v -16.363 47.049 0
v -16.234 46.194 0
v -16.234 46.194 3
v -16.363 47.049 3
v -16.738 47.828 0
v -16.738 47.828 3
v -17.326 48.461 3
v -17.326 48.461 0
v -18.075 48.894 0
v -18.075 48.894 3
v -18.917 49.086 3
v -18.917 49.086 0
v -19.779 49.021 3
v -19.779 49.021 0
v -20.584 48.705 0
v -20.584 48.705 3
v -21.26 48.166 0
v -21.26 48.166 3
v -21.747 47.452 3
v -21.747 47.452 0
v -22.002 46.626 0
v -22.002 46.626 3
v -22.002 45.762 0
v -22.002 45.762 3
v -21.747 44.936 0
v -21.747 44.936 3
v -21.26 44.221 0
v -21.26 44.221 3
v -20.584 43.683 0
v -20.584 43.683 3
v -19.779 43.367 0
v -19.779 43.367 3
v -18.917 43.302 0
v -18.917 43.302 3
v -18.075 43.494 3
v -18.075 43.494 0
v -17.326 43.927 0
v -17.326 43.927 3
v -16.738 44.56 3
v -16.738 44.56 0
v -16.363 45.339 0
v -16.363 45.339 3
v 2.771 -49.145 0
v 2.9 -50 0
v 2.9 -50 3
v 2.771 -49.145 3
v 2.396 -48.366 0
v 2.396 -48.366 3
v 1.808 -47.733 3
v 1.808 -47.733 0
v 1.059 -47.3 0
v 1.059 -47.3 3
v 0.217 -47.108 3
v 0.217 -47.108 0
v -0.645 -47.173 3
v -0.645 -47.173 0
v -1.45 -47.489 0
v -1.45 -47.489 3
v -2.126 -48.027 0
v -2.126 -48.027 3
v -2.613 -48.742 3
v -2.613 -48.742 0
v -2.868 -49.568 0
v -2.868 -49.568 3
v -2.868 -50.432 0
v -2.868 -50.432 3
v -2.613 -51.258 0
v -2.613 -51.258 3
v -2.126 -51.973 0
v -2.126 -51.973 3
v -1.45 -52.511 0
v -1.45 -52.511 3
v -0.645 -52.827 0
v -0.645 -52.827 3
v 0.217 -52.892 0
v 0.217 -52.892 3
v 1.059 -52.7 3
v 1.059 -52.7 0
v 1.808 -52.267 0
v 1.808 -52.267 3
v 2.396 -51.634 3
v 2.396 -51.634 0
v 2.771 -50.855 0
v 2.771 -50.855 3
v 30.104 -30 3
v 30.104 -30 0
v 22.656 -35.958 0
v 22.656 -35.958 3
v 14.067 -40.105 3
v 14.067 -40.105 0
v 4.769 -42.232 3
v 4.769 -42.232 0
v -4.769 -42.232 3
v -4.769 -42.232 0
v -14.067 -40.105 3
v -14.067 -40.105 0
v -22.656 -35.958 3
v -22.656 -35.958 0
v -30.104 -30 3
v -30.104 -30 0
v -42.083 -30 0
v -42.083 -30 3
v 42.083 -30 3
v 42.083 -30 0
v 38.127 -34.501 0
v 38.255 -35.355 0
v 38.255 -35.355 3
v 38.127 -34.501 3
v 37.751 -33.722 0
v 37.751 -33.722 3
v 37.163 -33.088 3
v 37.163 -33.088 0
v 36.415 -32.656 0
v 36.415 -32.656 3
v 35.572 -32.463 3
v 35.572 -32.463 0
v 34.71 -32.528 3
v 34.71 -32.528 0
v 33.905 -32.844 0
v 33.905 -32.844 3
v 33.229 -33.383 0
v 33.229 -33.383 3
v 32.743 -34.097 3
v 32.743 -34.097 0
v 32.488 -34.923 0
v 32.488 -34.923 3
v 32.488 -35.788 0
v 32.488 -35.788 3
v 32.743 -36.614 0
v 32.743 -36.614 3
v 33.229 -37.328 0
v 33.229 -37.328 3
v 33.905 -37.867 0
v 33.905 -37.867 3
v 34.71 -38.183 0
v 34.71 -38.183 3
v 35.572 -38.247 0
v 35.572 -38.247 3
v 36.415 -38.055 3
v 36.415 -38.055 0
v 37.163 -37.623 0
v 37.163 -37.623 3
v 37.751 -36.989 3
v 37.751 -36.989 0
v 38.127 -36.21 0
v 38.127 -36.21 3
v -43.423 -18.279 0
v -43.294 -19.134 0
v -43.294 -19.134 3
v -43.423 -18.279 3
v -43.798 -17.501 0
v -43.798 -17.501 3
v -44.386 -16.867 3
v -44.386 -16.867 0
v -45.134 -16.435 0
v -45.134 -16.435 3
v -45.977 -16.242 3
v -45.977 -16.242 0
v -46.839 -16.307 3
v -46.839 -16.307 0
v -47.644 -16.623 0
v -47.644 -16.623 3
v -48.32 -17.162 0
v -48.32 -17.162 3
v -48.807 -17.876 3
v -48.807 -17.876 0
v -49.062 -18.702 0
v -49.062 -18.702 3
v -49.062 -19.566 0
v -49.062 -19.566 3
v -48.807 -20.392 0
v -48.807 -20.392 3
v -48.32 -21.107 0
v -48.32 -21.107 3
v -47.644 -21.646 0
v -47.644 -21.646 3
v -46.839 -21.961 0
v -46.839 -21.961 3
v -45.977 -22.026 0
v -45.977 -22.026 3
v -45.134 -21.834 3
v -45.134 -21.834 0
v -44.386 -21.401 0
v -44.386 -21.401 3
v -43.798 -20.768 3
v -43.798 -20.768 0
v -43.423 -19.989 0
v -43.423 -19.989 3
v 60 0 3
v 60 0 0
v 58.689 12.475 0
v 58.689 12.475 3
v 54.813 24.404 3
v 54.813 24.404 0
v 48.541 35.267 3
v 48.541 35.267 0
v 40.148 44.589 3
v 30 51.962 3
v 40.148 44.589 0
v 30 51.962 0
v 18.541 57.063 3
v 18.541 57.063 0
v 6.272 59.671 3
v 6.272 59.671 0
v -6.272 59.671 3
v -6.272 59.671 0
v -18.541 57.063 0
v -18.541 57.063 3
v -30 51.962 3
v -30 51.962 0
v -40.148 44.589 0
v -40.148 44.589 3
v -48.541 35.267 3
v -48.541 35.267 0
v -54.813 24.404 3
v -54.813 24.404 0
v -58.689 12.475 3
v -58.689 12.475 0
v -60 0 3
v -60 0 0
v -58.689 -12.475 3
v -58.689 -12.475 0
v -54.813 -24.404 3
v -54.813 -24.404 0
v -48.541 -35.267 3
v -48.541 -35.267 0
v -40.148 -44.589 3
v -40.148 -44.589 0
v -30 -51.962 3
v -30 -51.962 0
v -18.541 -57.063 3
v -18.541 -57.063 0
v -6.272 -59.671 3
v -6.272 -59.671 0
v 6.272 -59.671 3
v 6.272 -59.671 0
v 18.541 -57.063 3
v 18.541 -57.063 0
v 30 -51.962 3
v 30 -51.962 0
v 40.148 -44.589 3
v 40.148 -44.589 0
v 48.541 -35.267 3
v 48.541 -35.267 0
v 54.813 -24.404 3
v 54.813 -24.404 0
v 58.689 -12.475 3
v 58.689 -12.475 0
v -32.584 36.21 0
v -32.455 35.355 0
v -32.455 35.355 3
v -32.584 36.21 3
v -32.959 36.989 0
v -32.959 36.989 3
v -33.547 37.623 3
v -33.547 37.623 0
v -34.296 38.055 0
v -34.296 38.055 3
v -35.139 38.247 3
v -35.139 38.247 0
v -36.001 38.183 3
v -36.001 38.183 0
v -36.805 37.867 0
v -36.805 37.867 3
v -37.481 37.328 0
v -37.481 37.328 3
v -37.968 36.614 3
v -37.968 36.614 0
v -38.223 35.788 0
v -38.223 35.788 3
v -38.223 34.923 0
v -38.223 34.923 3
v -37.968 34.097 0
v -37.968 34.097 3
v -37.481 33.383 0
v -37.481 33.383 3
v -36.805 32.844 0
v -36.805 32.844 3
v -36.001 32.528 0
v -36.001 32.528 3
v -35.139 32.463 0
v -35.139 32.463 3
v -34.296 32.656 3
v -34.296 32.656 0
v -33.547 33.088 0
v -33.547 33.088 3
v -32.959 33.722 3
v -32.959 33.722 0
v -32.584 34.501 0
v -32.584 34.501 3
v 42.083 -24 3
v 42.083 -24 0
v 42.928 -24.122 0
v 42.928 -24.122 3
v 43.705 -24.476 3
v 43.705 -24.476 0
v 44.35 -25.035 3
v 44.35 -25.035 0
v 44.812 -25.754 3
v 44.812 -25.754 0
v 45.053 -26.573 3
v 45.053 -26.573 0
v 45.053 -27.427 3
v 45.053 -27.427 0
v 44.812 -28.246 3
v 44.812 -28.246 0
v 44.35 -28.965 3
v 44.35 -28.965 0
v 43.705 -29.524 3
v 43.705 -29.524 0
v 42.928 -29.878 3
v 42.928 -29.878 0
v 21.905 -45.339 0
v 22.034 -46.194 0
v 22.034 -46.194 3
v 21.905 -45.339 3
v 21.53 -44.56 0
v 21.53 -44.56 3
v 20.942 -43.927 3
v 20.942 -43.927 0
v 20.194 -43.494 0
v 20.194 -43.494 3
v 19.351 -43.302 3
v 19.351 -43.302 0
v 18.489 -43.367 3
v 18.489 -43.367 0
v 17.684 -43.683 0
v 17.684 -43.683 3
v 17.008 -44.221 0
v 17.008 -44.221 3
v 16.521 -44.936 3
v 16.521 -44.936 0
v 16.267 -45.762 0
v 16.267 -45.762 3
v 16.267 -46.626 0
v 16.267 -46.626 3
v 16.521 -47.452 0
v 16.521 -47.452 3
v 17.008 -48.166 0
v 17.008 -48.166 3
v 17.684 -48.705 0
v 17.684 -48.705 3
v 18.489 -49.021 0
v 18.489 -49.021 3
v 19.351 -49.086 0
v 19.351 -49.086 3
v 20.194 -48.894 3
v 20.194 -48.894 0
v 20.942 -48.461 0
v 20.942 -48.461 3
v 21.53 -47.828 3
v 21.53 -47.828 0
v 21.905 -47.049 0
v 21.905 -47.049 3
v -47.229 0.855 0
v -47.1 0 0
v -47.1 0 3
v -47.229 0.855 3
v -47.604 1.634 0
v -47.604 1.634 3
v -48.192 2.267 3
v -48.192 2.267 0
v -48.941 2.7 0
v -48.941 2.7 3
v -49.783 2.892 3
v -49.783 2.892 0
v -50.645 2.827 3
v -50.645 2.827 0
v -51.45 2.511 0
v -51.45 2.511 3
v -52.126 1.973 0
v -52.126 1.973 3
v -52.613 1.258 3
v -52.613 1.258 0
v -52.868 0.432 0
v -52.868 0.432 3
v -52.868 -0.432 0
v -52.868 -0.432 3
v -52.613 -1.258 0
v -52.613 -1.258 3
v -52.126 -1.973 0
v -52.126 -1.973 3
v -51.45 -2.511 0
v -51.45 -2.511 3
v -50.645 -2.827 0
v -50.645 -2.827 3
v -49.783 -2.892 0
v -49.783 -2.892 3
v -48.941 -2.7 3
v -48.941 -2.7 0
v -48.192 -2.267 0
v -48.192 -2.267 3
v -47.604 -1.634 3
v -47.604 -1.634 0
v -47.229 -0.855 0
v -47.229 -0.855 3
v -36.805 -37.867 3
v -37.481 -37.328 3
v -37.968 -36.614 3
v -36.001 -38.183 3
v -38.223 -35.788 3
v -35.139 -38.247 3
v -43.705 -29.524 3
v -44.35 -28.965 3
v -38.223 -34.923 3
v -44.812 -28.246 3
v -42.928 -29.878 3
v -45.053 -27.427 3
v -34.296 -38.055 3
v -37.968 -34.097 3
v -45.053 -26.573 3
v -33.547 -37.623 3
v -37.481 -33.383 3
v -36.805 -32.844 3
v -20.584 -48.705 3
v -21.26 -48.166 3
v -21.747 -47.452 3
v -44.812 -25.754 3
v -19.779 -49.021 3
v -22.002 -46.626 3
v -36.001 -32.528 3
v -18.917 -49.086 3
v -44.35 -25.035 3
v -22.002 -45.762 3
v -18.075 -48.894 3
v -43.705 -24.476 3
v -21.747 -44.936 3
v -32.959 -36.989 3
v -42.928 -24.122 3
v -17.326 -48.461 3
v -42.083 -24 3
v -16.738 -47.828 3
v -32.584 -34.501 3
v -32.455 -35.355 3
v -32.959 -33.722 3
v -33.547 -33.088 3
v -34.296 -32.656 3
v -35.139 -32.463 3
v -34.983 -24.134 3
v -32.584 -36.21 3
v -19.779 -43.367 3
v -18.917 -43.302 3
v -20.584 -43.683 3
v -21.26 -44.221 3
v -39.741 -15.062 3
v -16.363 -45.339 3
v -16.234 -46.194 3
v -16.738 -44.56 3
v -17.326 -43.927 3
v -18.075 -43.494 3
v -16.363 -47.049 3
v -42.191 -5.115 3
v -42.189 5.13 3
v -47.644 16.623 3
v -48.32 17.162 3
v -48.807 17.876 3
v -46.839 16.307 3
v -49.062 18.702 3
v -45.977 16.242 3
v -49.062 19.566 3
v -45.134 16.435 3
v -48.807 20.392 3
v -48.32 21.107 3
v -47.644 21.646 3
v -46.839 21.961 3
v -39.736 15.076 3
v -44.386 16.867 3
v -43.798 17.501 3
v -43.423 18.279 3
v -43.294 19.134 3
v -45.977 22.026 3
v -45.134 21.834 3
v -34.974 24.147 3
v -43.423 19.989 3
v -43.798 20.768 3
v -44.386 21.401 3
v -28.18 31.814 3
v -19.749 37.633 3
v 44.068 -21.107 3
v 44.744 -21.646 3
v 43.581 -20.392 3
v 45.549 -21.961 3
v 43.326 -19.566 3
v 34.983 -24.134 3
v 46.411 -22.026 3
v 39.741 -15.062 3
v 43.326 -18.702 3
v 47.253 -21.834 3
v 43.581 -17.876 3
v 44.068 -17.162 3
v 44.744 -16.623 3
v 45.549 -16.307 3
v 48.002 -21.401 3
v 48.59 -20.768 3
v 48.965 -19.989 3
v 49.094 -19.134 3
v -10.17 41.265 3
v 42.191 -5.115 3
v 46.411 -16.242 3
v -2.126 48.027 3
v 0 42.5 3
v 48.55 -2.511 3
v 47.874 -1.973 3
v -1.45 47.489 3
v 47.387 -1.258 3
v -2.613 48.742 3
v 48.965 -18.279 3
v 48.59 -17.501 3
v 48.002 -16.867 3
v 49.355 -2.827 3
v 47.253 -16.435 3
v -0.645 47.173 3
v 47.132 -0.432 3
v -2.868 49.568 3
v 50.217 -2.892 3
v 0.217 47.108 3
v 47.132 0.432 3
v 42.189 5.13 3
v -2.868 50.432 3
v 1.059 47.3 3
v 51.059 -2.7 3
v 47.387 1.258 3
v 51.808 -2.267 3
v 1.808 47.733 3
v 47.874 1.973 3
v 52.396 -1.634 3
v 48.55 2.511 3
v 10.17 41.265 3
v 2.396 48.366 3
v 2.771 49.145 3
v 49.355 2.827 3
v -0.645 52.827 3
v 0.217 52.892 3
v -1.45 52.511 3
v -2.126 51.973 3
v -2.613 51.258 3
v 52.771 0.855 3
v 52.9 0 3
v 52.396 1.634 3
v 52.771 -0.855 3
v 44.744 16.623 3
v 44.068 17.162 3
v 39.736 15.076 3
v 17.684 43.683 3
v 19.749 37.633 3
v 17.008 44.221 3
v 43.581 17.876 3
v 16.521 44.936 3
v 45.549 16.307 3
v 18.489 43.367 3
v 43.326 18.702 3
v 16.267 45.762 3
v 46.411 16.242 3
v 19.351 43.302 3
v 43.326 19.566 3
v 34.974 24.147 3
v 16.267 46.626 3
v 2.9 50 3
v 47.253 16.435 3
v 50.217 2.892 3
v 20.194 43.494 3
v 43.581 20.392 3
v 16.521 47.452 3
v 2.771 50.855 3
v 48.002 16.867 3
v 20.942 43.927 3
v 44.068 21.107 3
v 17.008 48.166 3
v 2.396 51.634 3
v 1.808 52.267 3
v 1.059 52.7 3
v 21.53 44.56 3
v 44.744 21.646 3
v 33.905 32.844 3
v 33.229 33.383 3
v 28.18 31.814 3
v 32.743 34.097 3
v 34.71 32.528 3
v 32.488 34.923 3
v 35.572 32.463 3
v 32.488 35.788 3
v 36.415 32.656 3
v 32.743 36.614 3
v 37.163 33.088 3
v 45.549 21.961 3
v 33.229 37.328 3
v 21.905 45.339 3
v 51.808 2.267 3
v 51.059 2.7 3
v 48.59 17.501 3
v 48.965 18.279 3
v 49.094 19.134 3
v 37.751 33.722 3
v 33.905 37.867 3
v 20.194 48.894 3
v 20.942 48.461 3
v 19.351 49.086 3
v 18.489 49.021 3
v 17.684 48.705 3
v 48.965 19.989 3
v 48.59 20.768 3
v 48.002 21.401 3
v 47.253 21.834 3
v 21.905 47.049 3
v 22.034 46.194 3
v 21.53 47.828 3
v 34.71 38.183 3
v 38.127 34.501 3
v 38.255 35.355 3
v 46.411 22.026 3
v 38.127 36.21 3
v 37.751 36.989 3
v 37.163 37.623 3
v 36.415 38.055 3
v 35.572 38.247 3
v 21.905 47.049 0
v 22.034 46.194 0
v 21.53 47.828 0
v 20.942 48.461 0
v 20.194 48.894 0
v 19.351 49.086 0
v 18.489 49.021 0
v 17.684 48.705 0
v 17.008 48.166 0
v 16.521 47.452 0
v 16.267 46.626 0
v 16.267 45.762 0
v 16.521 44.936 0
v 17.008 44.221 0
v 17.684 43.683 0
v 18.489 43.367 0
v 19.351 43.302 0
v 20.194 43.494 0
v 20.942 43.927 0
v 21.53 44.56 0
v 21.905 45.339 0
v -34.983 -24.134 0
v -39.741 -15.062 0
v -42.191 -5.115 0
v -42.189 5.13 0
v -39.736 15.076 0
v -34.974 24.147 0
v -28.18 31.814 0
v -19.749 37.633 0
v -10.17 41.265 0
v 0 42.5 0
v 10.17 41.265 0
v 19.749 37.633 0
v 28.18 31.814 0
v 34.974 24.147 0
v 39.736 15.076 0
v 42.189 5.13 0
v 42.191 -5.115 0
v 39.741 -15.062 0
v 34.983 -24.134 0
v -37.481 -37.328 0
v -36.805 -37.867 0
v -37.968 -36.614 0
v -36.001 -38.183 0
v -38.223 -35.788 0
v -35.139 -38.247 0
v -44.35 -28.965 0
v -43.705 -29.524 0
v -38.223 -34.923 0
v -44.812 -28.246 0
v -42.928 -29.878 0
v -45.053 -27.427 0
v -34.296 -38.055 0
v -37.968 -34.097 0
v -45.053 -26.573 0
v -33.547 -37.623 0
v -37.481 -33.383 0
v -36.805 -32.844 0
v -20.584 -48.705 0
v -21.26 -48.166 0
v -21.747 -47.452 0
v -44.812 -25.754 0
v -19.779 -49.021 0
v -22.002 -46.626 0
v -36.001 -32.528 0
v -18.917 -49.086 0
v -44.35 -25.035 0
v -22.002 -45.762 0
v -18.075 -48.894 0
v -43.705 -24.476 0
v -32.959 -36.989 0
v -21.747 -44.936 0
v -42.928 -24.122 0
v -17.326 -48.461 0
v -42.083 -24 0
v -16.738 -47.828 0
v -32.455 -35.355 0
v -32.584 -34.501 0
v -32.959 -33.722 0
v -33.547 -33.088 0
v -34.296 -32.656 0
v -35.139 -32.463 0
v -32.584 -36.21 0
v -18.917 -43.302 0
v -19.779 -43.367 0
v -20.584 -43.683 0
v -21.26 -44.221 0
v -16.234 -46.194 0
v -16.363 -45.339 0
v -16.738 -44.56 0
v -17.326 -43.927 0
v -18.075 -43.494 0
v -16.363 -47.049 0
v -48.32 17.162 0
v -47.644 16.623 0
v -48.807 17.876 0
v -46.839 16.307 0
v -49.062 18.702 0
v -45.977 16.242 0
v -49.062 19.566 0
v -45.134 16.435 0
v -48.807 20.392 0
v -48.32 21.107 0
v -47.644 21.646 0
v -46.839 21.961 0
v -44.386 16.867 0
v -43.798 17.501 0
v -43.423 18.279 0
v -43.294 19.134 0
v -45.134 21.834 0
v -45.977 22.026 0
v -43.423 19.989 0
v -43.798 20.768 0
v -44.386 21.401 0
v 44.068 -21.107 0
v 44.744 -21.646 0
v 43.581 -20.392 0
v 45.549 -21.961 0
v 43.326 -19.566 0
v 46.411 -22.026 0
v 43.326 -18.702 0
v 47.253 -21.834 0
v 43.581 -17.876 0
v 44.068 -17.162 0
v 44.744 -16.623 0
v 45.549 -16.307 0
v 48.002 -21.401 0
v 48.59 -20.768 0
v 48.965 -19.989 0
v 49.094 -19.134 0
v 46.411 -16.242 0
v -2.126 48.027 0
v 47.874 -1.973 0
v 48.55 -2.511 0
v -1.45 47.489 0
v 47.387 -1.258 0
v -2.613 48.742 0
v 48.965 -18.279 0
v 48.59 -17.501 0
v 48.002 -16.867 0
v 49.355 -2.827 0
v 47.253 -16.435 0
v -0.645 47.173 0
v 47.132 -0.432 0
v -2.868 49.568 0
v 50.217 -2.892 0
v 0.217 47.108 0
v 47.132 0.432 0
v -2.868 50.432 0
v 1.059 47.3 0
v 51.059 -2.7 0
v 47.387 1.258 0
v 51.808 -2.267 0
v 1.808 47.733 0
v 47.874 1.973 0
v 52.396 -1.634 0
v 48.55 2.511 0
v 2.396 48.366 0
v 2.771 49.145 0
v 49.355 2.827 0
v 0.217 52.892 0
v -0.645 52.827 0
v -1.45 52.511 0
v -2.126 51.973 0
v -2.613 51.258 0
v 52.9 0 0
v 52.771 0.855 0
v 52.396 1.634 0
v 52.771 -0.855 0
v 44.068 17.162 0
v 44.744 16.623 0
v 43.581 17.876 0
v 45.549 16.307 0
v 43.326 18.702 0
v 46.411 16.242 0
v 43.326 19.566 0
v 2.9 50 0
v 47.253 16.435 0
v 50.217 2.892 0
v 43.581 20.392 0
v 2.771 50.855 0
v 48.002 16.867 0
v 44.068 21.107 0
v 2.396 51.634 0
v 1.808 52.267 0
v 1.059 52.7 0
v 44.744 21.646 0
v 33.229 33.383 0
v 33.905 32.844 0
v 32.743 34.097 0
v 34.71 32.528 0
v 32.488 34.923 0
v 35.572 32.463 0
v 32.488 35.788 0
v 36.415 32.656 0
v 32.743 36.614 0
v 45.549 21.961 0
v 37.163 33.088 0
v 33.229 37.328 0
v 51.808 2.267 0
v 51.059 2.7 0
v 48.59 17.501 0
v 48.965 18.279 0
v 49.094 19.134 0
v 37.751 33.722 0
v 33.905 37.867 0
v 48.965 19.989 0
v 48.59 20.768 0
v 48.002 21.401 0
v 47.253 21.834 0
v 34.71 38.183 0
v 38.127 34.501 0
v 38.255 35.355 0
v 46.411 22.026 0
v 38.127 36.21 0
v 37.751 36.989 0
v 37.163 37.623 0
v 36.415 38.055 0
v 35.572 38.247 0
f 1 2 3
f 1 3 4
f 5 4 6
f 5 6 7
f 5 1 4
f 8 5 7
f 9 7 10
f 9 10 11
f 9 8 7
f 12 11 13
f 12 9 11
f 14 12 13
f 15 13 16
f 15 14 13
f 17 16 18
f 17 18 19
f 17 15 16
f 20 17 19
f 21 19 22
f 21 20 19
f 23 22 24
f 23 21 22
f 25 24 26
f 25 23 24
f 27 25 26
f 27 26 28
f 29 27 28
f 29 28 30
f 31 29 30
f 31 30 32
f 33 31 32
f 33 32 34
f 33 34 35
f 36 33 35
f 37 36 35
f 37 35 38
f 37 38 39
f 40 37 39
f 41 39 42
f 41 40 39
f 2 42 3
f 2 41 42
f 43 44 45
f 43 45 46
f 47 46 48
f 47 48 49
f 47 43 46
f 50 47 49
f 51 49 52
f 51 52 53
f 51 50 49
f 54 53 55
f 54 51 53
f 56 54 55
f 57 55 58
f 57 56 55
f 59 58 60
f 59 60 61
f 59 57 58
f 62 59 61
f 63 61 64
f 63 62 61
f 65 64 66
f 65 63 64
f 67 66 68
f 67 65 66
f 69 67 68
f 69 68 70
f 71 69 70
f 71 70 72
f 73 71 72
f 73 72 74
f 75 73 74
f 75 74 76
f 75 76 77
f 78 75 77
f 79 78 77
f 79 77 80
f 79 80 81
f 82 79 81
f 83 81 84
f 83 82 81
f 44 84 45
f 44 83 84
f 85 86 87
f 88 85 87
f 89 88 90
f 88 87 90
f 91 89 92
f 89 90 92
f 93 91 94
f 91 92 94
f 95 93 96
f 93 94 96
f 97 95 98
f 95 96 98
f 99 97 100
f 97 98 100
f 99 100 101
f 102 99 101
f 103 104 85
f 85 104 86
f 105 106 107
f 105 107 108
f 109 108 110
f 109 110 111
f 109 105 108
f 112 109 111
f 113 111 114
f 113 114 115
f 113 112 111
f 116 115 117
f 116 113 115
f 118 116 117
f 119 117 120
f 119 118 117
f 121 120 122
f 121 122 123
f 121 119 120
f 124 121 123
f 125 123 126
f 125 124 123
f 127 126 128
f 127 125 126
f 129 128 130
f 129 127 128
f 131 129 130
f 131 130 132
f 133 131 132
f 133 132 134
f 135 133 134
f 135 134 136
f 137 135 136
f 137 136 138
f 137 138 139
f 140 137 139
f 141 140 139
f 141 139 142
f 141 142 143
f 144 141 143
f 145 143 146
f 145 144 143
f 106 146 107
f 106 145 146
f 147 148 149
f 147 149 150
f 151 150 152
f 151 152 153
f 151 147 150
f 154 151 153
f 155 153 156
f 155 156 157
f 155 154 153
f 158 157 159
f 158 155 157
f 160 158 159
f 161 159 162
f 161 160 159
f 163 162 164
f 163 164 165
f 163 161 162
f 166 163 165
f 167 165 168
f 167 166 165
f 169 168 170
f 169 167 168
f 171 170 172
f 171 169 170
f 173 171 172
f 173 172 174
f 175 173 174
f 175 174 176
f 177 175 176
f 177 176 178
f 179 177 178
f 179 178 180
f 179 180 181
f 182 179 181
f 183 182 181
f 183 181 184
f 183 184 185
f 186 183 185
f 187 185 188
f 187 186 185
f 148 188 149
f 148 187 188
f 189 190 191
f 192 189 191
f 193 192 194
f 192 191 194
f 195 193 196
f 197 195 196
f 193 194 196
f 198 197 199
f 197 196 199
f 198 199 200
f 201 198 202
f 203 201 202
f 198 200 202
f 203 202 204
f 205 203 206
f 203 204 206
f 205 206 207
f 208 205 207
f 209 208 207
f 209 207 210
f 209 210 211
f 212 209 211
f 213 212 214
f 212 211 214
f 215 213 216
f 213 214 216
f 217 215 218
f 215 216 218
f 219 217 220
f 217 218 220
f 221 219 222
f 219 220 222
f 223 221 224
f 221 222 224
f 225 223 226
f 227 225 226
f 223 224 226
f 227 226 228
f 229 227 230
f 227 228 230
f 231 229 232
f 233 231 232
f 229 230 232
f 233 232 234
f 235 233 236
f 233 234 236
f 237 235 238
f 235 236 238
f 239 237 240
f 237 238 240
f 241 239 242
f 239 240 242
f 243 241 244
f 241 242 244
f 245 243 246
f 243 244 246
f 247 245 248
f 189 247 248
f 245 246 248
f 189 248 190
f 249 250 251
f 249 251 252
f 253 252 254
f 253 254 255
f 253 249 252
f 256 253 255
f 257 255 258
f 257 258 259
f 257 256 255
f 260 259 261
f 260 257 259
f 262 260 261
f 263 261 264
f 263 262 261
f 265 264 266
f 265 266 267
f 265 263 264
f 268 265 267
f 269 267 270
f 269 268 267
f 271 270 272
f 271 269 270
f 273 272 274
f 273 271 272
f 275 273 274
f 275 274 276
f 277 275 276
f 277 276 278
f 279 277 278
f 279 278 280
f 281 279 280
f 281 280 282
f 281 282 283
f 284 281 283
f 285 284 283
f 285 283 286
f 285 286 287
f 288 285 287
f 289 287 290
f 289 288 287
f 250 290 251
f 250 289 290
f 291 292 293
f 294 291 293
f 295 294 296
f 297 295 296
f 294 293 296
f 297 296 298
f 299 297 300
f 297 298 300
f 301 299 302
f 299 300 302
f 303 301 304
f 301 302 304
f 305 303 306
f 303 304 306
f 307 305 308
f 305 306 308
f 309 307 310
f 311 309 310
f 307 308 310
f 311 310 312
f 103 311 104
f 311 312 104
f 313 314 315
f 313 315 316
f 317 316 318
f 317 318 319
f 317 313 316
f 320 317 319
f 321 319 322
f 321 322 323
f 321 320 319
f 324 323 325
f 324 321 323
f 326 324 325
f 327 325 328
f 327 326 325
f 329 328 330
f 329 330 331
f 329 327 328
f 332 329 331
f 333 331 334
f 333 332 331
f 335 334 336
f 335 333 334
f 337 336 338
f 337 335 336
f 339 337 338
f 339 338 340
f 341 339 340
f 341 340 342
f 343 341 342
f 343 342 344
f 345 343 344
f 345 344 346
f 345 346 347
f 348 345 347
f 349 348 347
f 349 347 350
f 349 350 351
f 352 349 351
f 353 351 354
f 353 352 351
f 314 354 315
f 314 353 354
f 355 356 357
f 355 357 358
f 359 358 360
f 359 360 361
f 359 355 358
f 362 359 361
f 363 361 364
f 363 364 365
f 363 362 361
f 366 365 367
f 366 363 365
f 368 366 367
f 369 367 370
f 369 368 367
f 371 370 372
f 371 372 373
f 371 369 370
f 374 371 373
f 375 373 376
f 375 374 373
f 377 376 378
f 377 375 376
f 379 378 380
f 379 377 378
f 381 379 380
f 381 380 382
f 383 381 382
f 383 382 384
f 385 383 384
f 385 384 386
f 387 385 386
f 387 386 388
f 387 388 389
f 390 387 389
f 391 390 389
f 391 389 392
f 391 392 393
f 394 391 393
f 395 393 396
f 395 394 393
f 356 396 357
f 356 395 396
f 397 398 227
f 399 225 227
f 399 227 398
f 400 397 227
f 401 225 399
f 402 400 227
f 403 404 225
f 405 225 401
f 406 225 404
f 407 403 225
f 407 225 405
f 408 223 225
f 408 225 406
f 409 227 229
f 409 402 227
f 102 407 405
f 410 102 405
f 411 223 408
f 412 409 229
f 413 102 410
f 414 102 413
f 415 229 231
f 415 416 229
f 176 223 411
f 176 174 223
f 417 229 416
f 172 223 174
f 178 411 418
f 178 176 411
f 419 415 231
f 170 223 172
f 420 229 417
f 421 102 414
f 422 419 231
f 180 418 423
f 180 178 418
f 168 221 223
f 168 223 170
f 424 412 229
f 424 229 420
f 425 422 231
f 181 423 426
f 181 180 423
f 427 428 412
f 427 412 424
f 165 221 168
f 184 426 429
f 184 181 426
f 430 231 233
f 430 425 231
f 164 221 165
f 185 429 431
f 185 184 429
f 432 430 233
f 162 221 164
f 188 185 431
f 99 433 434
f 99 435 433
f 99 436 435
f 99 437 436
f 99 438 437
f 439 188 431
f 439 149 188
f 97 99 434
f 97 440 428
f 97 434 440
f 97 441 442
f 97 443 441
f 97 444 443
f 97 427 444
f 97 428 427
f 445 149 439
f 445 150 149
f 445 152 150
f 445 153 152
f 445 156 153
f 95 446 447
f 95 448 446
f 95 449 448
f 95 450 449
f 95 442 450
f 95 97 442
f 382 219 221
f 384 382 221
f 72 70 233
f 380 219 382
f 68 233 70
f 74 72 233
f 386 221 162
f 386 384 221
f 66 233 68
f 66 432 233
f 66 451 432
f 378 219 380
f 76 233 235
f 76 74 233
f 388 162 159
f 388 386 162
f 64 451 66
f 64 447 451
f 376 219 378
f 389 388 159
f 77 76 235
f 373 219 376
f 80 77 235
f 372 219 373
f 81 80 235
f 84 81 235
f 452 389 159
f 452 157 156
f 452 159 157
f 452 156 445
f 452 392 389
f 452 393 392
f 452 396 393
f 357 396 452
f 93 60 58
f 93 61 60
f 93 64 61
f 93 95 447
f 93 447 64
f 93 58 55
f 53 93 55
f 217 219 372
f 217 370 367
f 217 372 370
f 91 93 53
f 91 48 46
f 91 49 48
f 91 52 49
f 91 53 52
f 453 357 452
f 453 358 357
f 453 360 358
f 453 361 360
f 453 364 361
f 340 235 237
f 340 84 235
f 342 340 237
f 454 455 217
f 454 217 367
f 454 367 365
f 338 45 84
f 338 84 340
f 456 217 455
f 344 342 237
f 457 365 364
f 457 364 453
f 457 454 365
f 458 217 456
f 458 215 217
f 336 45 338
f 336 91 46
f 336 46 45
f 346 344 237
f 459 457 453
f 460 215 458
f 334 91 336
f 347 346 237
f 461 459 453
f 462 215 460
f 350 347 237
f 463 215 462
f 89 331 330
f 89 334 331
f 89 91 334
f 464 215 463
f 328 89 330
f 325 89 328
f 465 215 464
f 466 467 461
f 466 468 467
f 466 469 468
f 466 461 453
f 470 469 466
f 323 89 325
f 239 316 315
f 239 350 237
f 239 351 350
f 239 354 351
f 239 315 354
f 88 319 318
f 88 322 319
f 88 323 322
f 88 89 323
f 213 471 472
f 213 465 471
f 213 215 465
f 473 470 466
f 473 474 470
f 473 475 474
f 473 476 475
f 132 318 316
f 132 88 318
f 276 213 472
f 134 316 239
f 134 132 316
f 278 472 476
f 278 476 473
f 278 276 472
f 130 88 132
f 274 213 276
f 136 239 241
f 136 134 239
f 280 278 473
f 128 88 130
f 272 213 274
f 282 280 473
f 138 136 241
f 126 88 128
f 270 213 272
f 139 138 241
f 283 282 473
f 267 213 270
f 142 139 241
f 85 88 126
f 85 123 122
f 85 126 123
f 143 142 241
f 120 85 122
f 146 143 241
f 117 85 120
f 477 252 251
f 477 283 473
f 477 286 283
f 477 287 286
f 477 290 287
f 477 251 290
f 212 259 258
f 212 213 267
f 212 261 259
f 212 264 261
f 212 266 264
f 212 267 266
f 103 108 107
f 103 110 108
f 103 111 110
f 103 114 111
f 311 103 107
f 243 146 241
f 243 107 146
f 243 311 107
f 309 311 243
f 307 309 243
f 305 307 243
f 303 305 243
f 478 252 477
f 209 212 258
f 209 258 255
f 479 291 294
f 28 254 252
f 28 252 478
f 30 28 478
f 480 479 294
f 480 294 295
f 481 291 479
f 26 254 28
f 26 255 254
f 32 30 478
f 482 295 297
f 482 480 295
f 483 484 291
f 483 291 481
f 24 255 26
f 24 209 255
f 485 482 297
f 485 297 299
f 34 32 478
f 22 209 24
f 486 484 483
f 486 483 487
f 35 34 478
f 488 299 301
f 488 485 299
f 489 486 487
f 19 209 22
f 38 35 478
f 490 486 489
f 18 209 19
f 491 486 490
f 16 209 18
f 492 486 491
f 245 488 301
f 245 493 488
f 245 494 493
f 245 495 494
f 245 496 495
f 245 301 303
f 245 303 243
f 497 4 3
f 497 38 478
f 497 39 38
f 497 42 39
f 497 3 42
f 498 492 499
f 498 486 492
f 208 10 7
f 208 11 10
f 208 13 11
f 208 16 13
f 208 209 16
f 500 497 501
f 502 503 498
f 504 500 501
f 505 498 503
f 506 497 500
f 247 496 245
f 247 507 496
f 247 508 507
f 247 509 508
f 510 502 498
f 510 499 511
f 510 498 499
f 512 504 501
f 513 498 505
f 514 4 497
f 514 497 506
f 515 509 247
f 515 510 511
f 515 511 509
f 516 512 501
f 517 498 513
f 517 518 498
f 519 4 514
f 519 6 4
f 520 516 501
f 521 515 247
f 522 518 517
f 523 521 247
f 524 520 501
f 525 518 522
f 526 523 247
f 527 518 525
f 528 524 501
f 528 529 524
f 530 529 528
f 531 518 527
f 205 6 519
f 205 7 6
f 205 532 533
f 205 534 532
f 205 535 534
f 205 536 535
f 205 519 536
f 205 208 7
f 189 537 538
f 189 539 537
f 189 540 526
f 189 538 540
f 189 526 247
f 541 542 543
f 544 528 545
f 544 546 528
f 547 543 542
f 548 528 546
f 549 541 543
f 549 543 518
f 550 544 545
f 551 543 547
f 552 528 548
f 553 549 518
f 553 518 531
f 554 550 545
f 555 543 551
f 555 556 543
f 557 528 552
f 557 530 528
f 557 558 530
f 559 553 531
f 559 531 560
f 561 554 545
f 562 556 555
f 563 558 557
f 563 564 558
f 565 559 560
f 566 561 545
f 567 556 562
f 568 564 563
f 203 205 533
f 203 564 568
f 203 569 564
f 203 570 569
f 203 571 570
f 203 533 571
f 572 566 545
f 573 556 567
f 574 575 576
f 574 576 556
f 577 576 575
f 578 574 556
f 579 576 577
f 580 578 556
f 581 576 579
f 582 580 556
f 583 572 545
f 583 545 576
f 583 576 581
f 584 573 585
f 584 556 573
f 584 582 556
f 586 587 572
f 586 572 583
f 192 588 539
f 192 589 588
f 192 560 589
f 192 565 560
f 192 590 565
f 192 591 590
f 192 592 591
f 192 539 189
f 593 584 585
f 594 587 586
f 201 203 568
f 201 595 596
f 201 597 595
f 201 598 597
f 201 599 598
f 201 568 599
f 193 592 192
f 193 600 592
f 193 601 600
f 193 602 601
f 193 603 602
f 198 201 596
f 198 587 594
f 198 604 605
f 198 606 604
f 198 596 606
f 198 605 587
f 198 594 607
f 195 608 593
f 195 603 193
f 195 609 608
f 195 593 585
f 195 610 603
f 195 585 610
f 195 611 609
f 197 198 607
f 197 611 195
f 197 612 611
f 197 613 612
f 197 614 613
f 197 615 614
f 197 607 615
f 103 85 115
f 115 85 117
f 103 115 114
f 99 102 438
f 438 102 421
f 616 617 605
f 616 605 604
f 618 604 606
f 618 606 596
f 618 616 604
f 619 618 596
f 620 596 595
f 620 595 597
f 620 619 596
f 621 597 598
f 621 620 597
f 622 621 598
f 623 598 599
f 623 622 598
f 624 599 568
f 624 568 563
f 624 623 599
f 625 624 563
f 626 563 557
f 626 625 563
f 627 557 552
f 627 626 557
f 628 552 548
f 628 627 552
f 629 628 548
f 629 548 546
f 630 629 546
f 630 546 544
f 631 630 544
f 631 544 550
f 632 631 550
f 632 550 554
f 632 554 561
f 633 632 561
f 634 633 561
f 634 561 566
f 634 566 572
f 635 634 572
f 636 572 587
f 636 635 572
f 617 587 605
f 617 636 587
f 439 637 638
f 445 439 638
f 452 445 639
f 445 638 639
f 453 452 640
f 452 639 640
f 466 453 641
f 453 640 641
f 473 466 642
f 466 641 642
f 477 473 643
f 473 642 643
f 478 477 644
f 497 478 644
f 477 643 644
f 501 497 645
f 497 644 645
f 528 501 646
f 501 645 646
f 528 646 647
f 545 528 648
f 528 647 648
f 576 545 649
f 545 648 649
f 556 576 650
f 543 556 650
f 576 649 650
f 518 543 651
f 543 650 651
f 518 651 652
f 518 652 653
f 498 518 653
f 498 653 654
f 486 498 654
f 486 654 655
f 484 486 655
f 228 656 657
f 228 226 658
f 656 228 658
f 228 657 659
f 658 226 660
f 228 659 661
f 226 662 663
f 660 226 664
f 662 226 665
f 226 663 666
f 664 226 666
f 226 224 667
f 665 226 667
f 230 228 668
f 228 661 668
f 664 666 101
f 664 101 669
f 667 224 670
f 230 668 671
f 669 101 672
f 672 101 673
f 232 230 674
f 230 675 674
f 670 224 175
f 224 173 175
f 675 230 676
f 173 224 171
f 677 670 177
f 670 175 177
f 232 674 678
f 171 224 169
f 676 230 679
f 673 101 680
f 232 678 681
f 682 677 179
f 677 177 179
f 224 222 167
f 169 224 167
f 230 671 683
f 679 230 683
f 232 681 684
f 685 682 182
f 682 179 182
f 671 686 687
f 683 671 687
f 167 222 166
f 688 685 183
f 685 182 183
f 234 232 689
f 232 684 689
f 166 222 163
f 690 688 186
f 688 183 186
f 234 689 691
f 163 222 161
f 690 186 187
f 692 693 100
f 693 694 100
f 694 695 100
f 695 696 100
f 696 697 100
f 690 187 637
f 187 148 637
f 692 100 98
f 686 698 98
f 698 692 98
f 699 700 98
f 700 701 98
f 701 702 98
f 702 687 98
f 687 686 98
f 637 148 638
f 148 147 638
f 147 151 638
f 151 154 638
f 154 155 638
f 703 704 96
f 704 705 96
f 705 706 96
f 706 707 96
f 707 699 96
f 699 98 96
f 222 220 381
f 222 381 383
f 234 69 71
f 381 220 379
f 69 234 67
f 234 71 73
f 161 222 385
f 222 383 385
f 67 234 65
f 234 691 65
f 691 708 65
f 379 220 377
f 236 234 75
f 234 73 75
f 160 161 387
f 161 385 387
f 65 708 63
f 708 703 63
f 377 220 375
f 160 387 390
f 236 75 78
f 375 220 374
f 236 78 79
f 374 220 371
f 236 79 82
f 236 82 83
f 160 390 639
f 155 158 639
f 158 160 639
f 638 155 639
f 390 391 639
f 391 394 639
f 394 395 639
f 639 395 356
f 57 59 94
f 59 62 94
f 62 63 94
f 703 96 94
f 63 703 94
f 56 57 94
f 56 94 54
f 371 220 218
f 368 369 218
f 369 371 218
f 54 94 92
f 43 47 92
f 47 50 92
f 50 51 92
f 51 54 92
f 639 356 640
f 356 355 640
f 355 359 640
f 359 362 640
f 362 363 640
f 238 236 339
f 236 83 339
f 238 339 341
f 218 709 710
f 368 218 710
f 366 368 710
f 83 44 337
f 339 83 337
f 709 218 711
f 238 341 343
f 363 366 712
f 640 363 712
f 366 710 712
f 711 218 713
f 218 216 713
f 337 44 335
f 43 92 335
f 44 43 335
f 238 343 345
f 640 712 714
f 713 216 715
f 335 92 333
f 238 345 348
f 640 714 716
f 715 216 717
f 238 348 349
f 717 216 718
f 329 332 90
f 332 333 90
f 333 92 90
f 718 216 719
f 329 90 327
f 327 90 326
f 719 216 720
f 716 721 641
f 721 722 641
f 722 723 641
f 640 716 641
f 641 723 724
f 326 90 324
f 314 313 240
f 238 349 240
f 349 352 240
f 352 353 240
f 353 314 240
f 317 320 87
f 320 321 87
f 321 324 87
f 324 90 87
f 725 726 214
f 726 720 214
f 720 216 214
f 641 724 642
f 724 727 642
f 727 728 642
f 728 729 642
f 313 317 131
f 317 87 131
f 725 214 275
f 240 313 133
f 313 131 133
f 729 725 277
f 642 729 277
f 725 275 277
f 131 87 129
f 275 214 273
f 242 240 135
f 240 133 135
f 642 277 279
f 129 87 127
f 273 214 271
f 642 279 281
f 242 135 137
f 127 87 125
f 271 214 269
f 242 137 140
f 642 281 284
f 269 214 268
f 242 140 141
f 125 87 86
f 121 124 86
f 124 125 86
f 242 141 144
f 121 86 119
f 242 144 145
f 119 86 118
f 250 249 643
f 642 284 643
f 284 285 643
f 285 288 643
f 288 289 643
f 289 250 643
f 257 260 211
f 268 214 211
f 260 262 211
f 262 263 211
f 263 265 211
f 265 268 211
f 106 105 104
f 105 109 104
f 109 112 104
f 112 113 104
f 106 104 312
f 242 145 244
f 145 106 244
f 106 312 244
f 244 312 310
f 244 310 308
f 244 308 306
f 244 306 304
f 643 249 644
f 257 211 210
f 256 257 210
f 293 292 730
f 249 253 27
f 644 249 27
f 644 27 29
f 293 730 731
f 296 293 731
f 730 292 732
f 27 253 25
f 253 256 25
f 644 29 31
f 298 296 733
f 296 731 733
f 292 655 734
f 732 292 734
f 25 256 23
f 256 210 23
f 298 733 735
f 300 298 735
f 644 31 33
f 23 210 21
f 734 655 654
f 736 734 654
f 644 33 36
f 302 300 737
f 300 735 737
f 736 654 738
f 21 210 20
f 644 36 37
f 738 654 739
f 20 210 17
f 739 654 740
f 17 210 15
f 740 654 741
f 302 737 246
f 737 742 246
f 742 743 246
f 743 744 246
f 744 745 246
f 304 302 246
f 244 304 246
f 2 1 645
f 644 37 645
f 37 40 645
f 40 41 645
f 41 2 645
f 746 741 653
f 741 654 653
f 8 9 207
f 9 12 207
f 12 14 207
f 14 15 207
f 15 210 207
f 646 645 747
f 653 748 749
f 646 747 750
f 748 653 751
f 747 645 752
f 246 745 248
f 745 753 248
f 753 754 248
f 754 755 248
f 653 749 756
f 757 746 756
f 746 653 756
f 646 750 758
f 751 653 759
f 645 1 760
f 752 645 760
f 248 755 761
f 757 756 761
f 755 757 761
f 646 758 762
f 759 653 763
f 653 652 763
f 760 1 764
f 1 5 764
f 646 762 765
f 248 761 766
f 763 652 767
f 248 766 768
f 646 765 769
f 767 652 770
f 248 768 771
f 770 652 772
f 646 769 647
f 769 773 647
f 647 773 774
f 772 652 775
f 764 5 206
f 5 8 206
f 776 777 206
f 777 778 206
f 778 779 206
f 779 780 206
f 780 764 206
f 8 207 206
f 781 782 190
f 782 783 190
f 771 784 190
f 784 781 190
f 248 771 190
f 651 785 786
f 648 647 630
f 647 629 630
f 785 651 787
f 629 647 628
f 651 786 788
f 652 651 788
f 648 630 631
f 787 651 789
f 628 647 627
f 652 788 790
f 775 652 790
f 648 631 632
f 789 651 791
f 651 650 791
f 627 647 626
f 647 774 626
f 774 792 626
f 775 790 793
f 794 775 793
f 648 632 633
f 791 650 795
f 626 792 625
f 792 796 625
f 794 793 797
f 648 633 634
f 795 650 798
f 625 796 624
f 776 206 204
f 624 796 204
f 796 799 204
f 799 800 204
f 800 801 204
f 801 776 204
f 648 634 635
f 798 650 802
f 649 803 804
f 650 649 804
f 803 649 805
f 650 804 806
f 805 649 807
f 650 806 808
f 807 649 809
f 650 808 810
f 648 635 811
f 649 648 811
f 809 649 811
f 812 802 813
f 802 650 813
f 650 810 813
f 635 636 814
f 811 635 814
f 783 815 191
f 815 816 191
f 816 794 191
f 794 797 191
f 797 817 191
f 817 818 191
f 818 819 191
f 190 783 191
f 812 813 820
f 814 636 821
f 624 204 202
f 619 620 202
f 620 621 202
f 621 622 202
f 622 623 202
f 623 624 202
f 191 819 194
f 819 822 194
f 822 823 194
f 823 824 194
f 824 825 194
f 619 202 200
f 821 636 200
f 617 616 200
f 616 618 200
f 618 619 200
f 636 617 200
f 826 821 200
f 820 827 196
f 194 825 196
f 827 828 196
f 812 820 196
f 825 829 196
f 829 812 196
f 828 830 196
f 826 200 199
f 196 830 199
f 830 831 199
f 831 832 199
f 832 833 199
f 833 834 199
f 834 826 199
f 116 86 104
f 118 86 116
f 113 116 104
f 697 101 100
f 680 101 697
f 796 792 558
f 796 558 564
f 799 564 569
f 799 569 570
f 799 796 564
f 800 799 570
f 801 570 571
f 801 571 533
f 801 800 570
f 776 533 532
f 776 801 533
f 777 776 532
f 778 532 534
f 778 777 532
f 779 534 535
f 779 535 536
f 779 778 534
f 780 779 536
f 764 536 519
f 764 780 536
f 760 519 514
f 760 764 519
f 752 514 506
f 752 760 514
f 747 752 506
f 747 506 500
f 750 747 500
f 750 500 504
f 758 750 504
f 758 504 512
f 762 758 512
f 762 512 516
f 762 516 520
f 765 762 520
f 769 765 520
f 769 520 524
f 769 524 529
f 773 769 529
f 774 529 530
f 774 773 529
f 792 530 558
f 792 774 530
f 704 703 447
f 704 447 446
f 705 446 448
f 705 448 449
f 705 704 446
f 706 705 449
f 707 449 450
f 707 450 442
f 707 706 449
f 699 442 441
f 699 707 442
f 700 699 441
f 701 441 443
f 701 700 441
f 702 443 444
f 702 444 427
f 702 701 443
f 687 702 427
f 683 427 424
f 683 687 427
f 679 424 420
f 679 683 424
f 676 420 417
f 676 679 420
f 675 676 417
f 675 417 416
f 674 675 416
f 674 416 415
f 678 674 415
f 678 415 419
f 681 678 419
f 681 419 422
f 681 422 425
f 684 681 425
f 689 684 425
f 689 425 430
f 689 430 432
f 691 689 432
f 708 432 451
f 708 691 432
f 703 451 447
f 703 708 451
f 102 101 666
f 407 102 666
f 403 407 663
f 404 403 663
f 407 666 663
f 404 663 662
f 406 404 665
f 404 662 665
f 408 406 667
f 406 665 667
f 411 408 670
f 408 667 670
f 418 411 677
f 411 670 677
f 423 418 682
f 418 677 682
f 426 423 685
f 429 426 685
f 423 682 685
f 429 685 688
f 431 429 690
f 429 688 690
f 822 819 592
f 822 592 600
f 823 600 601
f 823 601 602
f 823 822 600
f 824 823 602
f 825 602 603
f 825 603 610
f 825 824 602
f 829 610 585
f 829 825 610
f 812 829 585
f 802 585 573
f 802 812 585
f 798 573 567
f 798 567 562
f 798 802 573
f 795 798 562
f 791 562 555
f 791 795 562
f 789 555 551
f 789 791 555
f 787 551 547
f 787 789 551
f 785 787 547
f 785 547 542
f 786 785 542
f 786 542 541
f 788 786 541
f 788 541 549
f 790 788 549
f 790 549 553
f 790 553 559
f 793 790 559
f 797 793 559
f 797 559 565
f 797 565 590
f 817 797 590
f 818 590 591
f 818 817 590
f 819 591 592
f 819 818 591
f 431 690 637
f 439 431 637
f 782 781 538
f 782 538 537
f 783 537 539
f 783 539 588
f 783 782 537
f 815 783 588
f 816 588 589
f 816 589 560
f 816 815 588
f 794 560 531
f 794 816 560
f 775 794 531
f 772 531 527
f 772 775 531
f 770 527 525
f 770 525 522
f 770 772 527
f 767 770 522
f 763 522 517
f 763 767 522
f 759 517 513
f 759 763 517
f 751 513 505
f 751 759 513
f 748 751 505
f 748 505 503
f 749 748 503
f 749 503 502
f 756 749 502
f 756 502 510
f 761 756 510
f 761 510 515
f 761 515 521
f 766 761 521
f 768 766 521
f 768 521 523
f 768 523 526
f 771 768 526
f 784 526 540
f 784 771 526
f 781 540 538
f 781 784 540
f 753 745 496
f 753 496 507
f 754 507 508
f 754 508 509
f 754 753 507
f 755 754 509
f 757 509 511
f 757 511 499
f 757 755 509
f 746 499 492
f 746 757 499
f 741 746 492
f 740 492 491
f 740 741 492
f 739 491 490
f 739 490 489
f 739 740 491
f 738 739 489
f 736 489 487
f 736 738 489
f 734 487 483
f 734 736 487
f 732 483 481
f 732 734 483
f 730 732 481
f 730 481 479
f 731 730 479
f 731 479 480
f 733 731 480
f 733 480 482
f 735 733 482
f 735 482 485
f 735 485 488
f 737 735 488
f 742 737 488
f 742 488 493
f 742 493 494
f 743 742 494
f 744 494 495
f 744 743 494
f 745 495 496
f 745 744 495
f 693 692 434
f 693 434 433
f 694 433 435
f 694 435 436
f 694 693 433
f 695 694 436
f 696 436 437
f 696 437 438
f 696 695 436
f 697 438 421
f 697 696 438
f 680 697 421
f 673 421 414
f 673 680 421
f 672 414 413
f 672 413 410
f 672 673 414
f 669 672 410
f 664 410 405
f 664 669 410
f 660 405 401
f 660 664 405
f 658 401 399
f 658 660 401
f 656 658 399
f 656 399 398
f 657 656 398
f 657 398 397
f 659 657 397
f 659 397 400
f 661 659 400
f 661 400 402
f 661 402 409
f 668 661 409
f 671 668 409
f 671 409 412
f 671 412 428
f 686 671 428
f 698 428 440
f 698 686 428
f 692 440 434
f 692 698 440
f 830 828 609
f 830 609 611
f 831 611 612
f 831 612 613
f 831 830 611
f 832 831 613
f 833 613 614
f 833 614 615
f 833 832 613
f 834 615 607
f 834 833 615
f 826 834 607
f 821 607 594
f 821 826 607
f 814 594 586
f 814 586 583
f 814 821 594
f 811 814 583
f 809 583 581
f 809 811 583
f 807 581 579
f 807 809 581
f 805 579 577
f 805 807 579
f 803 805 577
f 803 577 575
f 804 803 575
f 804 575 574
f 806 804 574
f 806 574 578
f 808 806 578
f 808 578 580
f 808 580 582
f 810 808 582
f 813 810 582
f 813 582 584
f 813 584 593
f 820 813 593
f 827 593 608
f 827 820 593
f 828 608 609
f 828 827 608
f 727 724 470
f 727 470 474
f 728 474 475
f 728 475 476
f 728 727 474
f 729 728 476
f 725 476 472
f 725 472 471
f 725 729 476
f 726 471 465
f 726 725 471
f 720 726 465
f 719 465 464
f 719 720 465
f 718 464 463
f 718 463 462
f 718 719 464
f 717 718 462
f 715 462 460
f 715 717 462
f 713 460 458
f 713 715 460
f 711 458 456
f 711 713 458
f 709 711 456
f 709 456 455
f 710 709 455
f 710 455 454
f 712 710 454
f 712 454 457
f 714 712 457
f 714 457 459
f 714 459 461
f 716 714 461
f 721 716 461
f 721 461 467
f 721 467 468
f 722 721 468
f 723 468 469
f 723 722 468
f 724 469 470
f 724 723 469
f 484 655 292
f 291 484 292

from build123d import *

# Parameters (mm, degrees)
F0_R     = 60
F0_R_2   = 2.9
F1_DEPTH = 3


with BuildPart() as f1:
    # F0 (on Top) → F1 (new body)
    with BuildSketch(Plane.XY):
        Circle(F0_R)
        with Locations((-35.355339, -35.355339)):
            Circle(F0_R_2, mode=Mode.SUBTRACT)
        with Locations((-19.134172, -46.193977)):
            Circle(F0_R_2, mode=Mode.SUBTRACT)
        with Locations((-46.193977, -19.134172)):
            Circle(F0_R_2, mode=Mode.SUBTRACT)
        with Locations((0, -50)):
            Circle(F0_R_2, mode=Mode.SUBTRACT)
        with Locations((19.134172, -46.193977)):
            Circle(F0_R_2, mode=Mode.SUBTRACT)
        with Locations((35.355339, -35.355339)):
            Circle(F0_R_2, mode=Mode.SUBTRACT)
        with Locations((46.193977, -19.134172)):
            Circle(F0_R_2, mode=Mode.SUBTRACT)
        with Locations((-50, 0)):
            Circle(F0_R_2, mode=Mode.SUBTRACT)
        with Locations((-46.193977, 19.134172)):
            Circle(F0_R_2, mode=Mode.SUBTRACT)
        with Locations((-35.355339, 35.355339)):
            Circle(F0_R_2, mode=Mode.SUBTRACT)
        with Locations((-19.134172, 46.193977)):
            Circle(F0_R_2, mode=Mode.SUBTRACT)
        with BuildLine():
            ThreePointArc((-34.982735, -24.134172), (0, 42.5), (34.982735, -24.134172))
            Line((34.982735, -24.134172), (42.083251, -24))
            ThreePointArc((42.083251, -24), (45.083251, -27), (42.083251, -30))
            Line((42.083251, -30), (30.103986, -30))
            ThreePointArc((30.103986, -30), (0, -42.5), (-30.103986, -30))
            Line((-30.103986, -30), (-42.083251, -30))
            ThreePointArc((-42.083251, -30), (-45.083251, -27), (-42.083251, -24))
            Line((-42.083251, -24), (-34.982735, -24.134172))
        make_face(mode=Mode.SUBTRACT)
        with Locations((50, 0)):
            Circle(F0_R_2, mode=Mode.SUBTRACT)
        with Locations((46.193977, 19.134172)):
            Circle(F0_R_2, mode=Mode.SUBTRACT)
        with Locations((0, 50)):
            Circle(F0_R_2, mode=Mode.SUBTRACT)
        with Locations((19.134172, 46.193977)):
            Circle(F0_R_2, mode=Mode.SUBTRACT)
        with Locations((35.355339, 35.355339)):
            Circle(F0_R_2, mode=Mode.SUBTRACT)
    extrude(amount=F1_DEPTH)


solid = f1.part
